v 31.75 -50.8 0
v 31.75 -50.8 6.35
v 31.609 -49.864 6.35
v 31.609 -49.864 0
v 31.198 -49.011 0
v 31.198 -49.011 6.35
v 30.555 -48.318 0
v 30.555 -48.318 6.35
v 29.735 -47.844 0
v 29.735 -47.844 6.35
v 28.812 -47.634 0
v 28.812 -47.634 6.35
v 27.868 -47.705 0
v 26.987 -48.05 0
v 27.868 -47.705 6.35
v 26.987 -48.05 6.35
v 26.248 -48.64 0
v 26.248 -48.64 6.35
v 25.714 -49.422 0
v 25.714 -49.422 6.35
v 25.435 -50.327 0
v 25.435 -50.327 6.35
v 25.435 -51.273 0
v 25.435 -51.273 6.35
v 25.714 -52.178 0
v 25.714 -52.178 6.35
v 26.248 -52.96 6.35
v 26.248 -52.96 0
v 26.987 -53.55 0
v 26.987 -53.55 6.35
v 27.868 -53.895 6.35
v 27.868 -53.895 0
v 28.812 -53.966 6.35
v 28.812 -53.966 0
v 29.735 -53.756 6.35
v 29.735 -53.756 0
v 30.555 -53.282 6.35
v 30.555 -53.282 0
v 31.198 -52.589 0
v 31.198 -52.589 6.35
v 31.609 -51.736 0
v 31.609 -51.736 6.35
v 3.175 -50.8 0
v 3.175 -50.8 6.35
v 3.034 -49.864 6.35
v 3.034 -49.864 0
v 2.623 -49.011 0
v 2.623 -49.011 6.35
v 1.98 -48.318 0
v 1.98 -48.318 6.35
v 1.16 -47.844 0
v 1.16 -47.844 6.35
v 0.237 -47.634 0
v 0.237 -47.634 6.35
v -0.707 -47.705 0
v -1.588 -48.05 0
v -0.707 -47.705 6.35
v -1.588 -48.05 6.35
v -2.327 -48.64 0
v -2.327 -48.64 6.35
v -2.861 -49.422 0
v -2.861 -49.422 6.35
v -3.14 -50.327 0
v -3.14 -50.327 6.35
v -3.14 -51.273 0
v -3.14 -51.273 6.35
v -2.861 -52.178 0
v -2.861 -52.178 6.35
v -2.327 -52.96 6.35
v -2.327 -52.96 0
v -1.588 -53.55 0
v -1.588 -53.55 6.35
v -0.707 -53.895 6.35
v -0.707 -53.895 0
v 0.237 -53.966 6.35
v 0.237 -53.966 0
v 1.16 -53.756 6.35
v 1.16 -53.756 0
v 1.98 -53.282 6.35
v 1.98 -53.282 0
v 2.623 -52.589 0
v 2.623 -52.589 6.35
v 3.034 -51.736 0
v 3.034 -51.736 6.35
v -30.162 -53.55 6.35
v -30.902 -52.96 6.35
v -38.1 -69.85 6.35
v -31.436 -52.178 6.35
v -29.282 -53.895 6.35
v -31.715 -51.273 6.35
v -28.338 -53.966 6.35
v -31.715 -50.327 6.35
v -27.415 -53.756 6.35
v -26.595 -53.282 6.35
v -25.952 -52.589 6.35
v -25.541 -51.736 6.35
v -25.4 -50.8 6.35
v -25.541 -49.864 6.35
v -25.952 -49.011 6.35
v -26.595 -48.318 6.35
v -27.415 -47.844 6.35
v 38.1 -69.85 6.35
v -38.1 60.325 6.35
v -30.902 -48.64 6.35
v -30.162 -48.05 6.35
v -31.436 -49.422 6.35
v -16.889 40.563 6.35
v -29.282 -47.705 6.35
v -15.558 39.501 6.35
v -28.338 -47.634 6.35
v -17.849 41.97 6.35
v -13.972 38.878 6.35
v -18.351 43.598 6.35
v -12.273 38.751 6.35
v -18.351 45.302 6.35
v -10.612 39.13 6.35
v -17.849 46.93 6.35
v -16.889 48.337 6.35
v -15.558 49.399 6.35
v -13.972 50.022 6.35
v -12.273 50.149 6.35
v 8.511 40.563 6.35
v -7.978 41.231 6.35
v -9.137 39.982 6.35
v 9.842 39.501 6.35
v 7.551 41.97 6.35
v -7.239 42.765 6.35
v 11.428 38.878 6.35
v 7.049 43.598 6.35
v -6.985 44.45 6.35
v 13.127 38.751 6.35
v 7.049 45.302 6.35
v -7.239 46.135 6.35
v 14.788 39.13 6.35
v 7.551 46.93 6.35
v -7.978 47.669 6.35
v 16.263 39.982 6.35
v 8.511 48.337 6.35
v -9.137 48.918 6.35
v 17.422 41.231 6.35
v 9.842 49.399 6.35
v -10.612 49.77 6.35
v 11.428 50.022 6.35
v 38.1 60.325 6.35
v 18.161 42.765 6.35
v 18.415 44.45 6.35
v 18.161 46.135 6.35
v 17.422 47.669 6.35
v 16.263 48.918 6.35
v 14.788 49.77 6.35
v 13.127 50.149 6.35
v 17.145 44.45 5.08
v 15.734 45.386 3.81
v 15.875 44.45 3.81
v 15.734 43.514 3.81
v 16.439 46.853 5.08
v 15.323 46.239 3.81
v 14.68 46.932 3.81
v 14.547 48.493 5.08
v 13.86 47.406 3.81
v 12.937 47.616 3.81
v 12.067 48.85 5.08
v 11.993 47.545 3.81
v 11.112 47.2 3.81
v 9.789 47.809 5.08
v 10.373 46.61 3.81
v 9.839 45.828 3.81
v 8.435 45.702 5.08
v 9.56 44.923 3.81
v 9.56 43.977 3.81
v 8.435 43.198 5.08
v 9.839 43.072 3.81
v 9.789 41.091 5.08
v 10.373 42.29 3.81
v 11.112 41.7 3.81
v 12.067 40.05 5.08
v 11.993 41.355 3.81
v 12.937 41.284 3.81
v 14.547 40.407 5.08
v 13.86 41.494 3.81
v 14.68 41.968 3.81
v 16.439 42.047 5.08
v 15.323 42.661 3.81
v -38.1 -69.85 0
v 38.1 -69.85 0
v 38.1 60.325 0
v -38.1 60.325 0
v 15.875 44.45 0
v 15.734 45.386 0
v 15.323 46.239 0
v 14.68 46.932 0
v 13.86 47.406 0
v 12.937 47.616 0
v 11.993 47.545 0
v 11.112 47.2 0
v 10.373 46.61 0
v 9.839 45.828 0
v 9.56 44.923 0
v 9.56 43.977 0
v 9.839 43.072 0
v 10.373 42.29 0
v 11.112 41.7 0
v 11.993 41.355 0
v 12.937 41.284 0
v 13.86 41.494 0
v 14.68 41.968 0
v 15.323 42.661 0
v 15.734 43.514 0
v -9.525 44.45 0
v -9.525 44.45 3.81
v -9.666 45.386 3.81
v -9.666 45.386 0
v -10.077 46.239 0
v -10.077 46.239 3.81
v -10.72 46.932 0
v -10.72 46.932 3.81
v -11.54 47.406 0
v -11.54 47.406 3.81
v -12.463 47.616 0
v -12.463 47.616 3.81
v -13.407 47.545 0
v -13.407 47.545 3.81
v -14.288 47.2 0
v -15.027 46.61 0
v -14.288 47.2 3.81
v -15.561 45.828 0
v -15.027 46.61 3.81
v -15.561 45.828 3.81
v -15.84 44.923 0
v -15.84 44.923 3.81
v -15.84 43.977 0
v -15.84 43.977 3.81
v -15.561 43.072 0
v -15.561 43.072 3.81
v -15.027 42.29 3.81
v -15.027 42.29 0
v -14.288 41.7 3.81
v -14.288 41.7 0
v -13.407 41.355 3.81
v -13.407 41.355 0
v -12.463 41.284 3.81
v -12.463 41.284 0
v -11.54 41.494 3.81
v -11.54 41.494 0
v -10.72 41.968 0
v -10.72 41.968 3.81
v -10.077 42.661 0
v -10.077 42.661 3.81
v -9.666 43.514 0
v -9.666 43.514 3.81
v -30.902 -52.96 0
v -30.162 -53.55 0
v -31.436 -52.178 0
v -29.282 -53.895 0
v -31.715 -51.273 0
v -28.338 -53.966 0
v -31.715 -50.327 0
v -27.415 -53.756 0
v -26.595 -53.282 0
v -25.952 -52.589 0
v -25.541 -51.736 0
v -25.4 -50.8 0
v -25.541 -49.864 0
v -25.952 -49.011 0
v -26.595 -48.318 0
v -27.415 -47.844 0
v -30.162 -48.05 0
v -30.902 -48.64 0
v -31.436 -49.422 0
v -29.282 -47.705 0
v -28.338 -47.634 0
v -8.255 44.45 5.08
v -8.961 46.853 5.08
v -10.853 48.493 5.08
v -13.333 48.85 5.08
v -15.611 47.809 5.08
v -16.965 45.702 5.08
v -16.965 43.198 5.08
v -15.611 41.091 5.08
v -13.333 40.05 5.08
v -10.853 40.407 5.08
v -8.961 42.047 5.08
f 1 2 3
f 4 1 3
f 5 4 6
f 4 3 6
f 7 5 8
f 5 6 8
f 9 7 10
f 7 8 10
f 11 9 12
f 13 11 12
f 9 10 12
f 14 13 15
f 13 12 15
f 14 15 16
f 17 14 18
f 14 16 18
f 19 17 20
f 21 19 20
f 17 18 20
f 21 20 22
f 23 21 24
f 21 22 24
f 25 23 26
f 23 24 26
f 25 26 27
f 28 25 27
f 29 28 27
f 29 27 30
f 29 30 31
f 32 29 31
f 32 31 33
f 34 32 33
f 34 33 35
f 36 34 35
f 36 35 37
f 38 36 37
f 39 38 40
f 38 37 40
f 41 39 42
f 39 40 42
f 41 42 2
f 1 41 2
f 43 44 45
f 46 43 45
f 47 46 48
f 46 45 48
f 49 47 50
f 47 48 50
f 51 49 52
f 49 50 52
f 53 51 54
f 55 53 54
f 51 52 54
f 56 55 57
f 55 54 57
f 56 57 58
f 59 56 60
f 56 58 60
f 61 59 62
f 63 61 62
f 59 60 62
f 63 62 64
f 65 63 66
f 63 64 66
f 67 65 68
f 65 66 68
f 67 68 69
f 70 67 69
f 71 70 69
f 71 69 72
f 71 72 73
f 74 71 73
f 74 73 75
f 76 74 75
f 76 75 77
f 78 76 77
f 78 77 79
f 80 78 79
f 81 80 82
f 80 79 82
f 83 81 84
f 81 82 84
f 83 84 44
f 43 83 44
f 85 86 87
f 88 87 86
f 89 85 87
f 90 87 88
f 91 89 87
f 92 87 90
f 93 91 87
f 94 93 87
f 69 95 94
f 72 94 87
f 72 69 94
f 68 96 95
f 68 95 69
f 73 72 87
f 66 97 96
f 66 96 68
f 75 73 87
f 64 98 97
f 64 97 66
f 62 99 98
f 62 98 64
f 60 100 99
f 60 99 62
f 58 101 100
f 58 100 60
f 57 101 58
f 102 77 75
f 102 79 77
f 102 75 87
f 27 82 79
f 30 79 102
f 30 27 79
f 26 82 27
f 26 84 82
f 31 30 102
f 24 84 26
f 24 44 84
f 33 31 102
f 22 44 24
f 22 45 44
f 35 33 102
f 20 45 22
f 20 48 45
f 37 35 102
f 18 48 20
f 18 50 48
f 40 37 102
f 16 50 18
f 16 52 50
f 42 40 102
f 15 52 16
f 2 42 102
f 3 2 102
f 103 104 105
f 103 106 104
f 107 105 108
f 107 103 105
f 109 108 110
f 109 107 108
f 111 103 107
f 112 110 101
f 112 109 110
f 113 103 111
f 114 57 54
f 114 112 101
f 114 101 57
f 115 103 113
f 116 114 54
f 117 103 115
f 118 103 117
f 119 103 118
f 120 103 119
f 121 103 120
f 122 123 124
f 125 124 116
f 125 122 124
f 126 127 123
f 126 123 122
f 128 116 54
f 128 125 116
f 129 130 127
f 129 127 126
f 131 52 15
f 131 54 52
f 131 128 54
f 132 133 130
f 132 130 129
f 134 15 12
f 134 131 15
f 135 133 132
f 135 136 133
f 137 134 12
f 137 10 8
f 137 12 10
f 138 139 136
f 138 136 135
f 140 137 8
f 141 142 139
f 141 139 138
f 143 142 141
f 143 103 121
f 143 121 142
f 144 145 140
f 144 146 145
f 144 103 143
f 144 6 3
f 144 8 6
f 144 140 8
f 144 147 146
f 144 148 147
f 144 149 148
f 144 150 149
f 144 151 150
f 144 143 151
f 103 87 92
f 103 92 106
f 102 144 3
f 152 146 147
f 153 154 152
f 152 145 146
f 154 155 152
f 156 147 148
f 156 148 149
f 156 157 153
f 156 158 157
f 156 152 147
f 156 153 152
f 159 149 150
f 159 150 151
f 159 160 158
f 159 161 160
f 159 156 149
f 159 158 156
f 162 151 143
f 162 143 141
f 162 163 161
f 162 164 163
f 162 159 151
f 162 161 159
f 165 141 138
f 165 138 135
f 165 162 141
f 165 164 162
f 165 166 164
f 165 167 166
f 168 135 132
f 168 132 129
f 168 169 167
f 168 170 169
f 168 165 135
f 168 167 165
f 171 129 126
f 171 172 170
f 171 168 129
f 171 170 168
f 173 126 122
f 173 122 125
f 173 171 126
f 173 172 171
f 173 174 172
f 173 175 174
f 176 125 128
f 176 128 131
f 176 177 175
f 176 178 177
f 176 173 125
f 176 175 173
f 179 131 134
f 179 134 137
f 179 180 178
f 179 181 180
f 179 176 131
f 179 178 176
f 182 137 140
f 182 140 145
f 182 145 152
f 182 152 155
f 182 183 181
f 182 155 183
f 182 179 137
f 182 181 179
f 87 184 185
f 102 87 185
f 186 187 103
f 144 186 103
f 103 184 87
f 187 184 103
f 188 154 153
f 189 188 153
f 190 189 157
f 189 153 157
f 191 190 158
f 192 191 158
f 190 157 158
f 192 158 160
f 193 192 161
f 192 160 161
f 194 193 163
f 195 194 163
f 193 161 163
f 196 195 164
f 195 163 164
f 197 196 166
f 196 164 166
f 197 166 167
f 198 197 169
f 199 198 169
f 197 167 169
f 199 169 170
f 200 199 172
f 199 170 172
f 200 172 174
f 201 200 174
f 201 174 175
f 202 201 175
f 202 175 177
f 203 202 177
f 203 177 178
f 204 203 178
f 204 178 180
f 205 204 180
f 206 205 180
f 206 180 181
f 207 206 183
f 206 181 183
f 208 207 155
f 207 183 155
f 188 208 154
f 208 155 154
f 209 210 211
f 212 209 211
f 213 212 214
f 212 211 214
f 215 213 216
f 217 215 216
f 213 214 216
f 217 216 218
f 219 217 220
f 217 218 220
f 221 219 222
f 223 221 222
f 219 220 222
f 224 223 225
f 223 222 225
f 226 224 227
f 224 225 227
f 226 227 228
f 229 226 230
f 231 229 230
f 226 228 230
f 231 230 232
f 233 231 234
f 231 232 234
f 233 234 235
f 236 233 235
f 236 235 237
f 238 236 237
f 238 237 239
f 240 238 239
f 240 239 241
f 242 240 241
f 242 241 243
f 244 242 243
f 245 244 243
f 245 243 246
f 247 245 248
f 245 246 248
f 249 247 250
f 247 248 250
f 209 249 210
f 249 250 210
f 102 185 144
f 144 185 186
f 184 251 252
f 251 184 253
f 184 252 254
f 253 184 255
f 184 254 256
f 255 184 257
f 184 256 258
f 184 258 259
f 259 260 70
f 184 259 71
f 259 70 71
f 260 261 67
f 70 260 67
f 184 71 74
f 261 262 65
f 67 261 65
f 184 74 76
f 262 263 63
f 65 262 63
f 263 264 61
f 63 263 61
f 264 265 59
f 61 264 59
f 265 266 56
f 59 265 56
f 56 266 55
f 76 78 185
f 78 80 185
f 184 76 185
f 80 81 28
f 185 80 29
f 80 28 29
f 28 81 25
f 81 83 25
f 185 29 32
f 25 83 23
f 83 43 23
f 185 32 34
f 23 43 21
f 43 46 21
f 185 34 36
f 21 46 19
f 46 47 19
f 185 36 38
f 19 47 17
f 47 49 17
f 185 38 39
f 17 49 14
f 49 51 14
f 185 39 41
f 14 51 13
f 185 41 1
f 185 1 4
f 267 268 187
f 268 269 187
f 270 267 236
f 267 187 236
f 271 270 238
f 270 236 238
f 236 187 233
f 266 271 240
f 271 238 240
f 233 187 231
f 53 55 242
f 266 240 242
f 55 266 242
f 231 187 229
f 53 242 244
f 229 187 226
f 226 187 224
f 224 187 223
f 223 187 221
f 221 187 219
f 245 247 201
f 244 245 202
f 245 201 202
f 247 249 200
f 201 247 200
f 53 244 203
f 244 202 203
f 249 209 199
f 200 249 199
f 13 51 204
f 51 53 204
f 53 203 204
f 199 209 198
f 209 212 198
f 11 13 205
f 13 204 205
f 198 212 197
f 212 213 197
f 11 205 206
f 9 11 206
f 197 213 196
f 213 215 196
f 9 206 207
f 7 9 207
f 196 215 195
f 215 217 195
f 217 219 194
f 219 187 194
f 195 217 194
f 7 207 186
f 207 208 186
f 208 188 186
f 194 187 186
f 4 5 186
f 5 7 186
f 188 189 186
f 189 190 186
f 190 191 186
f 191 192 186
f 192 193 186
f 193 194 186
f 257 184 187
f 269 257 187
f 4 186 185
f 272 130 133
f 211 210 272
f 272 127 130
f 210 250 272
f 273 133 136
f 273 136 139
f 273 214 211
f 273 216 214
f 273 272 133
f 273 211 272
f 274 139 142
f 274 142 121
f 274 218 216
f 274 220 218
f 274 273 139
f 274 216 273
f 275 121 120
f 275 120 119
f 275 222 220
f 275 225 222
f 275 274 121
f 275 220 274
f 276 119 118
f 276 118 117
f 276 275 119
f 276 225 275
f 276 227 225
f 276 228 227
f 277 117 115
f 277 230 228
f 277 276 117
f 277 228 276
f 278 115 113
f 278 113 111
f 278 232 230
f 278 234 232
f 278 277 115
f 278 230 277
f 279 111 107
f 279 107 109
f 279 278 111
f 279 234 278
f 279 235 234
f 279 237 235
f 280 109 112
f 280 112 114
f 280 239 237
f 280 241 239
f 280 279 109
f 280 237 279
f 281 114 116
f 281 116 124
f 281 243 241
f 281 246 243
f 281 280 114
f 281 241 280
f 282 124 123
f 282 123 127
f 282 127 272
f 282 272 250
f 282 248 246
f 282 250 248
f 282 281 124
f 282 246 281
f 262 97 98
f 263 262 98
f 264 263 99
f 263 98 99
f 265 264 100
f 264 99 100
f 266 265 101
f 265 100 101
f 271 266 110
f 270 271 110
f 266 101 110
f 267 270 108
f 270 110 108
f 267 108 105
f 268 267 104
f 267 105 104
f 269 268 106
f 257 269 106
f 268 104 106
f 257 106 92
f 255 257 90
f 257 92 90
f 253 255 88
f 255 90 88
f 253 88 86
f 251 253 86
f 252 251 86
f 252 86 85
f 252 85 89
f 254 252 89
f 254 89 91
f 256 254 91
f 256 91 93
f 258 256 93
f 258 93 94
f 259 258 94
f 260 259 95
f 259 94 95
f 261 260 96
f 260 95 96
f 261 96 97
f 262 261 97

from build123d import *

# Parameters (mm, degrees)
SKETCH1_W           = 76.2
SKETCH1_H           = 139.7
BOSS_EXTRUDE1_DEPTH = 6.35
SKETCH2_R           = 3.175
CUT_EXTRUDE1_DEPTH  = 6.35
CHAMFER2_SIZE       = 2.54
SKETCH3_W           = 6.35
SKETCH3_H           = 9.525
CUT_EXTRUDE2_DEPTH  = 104.565365832


with BuildPart() as part:
    # Sketch1 → Boss-Extrude1 (new body)
    with BuildSketch(Plane.XY):
        Rectangle(SKETCH1_W, SKETCH1_H)
    extrude(amount=BOSS_EXTRUDE1_DEPTH)

    # Sketch2 → Cut-Extrude1 (cut)
    with BuildSketch(Plane.XY.offset(6.35)):
        with Locations((-12.7, 44.45)):
            Circle(SKETCH2_R)
        with Locations((12.7, 44.45)):
            Circle(SKETCH2_R)
        with Locations((-28.575, -50.8)):
            Circle(SKETCH2_R)
        with Locations((0, -50.8)):
            Circle(SKETCH2_R)
        with Locations((28.575, -50.8)):
            Circle(SKETCH2_R)
    extrude(amount=-CUT_EXTRUDE1_DEPTH, mode=Mode.SUBTRACT)

    # Chamfer2
    chamfer2_edges = [part.edges().sort_by_distance(p)[0] for p in [
        (-15.875, 44.45, 6.35),
        (9.525, 44.45, 6.35),
    ]]
    chamfer(chamfer2_edges, length=CHAMFER2_SIZE)

    # Sketch3 → Cut-Extrude2 (cut, through all)
    with BuildSketch(Plane.ZY.offset(38.1)):
        with Locations((3.175, 65.0875)):
            Rectangle(SKETCH3_W, SKETCH3_H)
    extrude(amount=-CUT_EXTRUDE2_DEPTH, mode=Mode.SUBTRACT)


solid = part.part
